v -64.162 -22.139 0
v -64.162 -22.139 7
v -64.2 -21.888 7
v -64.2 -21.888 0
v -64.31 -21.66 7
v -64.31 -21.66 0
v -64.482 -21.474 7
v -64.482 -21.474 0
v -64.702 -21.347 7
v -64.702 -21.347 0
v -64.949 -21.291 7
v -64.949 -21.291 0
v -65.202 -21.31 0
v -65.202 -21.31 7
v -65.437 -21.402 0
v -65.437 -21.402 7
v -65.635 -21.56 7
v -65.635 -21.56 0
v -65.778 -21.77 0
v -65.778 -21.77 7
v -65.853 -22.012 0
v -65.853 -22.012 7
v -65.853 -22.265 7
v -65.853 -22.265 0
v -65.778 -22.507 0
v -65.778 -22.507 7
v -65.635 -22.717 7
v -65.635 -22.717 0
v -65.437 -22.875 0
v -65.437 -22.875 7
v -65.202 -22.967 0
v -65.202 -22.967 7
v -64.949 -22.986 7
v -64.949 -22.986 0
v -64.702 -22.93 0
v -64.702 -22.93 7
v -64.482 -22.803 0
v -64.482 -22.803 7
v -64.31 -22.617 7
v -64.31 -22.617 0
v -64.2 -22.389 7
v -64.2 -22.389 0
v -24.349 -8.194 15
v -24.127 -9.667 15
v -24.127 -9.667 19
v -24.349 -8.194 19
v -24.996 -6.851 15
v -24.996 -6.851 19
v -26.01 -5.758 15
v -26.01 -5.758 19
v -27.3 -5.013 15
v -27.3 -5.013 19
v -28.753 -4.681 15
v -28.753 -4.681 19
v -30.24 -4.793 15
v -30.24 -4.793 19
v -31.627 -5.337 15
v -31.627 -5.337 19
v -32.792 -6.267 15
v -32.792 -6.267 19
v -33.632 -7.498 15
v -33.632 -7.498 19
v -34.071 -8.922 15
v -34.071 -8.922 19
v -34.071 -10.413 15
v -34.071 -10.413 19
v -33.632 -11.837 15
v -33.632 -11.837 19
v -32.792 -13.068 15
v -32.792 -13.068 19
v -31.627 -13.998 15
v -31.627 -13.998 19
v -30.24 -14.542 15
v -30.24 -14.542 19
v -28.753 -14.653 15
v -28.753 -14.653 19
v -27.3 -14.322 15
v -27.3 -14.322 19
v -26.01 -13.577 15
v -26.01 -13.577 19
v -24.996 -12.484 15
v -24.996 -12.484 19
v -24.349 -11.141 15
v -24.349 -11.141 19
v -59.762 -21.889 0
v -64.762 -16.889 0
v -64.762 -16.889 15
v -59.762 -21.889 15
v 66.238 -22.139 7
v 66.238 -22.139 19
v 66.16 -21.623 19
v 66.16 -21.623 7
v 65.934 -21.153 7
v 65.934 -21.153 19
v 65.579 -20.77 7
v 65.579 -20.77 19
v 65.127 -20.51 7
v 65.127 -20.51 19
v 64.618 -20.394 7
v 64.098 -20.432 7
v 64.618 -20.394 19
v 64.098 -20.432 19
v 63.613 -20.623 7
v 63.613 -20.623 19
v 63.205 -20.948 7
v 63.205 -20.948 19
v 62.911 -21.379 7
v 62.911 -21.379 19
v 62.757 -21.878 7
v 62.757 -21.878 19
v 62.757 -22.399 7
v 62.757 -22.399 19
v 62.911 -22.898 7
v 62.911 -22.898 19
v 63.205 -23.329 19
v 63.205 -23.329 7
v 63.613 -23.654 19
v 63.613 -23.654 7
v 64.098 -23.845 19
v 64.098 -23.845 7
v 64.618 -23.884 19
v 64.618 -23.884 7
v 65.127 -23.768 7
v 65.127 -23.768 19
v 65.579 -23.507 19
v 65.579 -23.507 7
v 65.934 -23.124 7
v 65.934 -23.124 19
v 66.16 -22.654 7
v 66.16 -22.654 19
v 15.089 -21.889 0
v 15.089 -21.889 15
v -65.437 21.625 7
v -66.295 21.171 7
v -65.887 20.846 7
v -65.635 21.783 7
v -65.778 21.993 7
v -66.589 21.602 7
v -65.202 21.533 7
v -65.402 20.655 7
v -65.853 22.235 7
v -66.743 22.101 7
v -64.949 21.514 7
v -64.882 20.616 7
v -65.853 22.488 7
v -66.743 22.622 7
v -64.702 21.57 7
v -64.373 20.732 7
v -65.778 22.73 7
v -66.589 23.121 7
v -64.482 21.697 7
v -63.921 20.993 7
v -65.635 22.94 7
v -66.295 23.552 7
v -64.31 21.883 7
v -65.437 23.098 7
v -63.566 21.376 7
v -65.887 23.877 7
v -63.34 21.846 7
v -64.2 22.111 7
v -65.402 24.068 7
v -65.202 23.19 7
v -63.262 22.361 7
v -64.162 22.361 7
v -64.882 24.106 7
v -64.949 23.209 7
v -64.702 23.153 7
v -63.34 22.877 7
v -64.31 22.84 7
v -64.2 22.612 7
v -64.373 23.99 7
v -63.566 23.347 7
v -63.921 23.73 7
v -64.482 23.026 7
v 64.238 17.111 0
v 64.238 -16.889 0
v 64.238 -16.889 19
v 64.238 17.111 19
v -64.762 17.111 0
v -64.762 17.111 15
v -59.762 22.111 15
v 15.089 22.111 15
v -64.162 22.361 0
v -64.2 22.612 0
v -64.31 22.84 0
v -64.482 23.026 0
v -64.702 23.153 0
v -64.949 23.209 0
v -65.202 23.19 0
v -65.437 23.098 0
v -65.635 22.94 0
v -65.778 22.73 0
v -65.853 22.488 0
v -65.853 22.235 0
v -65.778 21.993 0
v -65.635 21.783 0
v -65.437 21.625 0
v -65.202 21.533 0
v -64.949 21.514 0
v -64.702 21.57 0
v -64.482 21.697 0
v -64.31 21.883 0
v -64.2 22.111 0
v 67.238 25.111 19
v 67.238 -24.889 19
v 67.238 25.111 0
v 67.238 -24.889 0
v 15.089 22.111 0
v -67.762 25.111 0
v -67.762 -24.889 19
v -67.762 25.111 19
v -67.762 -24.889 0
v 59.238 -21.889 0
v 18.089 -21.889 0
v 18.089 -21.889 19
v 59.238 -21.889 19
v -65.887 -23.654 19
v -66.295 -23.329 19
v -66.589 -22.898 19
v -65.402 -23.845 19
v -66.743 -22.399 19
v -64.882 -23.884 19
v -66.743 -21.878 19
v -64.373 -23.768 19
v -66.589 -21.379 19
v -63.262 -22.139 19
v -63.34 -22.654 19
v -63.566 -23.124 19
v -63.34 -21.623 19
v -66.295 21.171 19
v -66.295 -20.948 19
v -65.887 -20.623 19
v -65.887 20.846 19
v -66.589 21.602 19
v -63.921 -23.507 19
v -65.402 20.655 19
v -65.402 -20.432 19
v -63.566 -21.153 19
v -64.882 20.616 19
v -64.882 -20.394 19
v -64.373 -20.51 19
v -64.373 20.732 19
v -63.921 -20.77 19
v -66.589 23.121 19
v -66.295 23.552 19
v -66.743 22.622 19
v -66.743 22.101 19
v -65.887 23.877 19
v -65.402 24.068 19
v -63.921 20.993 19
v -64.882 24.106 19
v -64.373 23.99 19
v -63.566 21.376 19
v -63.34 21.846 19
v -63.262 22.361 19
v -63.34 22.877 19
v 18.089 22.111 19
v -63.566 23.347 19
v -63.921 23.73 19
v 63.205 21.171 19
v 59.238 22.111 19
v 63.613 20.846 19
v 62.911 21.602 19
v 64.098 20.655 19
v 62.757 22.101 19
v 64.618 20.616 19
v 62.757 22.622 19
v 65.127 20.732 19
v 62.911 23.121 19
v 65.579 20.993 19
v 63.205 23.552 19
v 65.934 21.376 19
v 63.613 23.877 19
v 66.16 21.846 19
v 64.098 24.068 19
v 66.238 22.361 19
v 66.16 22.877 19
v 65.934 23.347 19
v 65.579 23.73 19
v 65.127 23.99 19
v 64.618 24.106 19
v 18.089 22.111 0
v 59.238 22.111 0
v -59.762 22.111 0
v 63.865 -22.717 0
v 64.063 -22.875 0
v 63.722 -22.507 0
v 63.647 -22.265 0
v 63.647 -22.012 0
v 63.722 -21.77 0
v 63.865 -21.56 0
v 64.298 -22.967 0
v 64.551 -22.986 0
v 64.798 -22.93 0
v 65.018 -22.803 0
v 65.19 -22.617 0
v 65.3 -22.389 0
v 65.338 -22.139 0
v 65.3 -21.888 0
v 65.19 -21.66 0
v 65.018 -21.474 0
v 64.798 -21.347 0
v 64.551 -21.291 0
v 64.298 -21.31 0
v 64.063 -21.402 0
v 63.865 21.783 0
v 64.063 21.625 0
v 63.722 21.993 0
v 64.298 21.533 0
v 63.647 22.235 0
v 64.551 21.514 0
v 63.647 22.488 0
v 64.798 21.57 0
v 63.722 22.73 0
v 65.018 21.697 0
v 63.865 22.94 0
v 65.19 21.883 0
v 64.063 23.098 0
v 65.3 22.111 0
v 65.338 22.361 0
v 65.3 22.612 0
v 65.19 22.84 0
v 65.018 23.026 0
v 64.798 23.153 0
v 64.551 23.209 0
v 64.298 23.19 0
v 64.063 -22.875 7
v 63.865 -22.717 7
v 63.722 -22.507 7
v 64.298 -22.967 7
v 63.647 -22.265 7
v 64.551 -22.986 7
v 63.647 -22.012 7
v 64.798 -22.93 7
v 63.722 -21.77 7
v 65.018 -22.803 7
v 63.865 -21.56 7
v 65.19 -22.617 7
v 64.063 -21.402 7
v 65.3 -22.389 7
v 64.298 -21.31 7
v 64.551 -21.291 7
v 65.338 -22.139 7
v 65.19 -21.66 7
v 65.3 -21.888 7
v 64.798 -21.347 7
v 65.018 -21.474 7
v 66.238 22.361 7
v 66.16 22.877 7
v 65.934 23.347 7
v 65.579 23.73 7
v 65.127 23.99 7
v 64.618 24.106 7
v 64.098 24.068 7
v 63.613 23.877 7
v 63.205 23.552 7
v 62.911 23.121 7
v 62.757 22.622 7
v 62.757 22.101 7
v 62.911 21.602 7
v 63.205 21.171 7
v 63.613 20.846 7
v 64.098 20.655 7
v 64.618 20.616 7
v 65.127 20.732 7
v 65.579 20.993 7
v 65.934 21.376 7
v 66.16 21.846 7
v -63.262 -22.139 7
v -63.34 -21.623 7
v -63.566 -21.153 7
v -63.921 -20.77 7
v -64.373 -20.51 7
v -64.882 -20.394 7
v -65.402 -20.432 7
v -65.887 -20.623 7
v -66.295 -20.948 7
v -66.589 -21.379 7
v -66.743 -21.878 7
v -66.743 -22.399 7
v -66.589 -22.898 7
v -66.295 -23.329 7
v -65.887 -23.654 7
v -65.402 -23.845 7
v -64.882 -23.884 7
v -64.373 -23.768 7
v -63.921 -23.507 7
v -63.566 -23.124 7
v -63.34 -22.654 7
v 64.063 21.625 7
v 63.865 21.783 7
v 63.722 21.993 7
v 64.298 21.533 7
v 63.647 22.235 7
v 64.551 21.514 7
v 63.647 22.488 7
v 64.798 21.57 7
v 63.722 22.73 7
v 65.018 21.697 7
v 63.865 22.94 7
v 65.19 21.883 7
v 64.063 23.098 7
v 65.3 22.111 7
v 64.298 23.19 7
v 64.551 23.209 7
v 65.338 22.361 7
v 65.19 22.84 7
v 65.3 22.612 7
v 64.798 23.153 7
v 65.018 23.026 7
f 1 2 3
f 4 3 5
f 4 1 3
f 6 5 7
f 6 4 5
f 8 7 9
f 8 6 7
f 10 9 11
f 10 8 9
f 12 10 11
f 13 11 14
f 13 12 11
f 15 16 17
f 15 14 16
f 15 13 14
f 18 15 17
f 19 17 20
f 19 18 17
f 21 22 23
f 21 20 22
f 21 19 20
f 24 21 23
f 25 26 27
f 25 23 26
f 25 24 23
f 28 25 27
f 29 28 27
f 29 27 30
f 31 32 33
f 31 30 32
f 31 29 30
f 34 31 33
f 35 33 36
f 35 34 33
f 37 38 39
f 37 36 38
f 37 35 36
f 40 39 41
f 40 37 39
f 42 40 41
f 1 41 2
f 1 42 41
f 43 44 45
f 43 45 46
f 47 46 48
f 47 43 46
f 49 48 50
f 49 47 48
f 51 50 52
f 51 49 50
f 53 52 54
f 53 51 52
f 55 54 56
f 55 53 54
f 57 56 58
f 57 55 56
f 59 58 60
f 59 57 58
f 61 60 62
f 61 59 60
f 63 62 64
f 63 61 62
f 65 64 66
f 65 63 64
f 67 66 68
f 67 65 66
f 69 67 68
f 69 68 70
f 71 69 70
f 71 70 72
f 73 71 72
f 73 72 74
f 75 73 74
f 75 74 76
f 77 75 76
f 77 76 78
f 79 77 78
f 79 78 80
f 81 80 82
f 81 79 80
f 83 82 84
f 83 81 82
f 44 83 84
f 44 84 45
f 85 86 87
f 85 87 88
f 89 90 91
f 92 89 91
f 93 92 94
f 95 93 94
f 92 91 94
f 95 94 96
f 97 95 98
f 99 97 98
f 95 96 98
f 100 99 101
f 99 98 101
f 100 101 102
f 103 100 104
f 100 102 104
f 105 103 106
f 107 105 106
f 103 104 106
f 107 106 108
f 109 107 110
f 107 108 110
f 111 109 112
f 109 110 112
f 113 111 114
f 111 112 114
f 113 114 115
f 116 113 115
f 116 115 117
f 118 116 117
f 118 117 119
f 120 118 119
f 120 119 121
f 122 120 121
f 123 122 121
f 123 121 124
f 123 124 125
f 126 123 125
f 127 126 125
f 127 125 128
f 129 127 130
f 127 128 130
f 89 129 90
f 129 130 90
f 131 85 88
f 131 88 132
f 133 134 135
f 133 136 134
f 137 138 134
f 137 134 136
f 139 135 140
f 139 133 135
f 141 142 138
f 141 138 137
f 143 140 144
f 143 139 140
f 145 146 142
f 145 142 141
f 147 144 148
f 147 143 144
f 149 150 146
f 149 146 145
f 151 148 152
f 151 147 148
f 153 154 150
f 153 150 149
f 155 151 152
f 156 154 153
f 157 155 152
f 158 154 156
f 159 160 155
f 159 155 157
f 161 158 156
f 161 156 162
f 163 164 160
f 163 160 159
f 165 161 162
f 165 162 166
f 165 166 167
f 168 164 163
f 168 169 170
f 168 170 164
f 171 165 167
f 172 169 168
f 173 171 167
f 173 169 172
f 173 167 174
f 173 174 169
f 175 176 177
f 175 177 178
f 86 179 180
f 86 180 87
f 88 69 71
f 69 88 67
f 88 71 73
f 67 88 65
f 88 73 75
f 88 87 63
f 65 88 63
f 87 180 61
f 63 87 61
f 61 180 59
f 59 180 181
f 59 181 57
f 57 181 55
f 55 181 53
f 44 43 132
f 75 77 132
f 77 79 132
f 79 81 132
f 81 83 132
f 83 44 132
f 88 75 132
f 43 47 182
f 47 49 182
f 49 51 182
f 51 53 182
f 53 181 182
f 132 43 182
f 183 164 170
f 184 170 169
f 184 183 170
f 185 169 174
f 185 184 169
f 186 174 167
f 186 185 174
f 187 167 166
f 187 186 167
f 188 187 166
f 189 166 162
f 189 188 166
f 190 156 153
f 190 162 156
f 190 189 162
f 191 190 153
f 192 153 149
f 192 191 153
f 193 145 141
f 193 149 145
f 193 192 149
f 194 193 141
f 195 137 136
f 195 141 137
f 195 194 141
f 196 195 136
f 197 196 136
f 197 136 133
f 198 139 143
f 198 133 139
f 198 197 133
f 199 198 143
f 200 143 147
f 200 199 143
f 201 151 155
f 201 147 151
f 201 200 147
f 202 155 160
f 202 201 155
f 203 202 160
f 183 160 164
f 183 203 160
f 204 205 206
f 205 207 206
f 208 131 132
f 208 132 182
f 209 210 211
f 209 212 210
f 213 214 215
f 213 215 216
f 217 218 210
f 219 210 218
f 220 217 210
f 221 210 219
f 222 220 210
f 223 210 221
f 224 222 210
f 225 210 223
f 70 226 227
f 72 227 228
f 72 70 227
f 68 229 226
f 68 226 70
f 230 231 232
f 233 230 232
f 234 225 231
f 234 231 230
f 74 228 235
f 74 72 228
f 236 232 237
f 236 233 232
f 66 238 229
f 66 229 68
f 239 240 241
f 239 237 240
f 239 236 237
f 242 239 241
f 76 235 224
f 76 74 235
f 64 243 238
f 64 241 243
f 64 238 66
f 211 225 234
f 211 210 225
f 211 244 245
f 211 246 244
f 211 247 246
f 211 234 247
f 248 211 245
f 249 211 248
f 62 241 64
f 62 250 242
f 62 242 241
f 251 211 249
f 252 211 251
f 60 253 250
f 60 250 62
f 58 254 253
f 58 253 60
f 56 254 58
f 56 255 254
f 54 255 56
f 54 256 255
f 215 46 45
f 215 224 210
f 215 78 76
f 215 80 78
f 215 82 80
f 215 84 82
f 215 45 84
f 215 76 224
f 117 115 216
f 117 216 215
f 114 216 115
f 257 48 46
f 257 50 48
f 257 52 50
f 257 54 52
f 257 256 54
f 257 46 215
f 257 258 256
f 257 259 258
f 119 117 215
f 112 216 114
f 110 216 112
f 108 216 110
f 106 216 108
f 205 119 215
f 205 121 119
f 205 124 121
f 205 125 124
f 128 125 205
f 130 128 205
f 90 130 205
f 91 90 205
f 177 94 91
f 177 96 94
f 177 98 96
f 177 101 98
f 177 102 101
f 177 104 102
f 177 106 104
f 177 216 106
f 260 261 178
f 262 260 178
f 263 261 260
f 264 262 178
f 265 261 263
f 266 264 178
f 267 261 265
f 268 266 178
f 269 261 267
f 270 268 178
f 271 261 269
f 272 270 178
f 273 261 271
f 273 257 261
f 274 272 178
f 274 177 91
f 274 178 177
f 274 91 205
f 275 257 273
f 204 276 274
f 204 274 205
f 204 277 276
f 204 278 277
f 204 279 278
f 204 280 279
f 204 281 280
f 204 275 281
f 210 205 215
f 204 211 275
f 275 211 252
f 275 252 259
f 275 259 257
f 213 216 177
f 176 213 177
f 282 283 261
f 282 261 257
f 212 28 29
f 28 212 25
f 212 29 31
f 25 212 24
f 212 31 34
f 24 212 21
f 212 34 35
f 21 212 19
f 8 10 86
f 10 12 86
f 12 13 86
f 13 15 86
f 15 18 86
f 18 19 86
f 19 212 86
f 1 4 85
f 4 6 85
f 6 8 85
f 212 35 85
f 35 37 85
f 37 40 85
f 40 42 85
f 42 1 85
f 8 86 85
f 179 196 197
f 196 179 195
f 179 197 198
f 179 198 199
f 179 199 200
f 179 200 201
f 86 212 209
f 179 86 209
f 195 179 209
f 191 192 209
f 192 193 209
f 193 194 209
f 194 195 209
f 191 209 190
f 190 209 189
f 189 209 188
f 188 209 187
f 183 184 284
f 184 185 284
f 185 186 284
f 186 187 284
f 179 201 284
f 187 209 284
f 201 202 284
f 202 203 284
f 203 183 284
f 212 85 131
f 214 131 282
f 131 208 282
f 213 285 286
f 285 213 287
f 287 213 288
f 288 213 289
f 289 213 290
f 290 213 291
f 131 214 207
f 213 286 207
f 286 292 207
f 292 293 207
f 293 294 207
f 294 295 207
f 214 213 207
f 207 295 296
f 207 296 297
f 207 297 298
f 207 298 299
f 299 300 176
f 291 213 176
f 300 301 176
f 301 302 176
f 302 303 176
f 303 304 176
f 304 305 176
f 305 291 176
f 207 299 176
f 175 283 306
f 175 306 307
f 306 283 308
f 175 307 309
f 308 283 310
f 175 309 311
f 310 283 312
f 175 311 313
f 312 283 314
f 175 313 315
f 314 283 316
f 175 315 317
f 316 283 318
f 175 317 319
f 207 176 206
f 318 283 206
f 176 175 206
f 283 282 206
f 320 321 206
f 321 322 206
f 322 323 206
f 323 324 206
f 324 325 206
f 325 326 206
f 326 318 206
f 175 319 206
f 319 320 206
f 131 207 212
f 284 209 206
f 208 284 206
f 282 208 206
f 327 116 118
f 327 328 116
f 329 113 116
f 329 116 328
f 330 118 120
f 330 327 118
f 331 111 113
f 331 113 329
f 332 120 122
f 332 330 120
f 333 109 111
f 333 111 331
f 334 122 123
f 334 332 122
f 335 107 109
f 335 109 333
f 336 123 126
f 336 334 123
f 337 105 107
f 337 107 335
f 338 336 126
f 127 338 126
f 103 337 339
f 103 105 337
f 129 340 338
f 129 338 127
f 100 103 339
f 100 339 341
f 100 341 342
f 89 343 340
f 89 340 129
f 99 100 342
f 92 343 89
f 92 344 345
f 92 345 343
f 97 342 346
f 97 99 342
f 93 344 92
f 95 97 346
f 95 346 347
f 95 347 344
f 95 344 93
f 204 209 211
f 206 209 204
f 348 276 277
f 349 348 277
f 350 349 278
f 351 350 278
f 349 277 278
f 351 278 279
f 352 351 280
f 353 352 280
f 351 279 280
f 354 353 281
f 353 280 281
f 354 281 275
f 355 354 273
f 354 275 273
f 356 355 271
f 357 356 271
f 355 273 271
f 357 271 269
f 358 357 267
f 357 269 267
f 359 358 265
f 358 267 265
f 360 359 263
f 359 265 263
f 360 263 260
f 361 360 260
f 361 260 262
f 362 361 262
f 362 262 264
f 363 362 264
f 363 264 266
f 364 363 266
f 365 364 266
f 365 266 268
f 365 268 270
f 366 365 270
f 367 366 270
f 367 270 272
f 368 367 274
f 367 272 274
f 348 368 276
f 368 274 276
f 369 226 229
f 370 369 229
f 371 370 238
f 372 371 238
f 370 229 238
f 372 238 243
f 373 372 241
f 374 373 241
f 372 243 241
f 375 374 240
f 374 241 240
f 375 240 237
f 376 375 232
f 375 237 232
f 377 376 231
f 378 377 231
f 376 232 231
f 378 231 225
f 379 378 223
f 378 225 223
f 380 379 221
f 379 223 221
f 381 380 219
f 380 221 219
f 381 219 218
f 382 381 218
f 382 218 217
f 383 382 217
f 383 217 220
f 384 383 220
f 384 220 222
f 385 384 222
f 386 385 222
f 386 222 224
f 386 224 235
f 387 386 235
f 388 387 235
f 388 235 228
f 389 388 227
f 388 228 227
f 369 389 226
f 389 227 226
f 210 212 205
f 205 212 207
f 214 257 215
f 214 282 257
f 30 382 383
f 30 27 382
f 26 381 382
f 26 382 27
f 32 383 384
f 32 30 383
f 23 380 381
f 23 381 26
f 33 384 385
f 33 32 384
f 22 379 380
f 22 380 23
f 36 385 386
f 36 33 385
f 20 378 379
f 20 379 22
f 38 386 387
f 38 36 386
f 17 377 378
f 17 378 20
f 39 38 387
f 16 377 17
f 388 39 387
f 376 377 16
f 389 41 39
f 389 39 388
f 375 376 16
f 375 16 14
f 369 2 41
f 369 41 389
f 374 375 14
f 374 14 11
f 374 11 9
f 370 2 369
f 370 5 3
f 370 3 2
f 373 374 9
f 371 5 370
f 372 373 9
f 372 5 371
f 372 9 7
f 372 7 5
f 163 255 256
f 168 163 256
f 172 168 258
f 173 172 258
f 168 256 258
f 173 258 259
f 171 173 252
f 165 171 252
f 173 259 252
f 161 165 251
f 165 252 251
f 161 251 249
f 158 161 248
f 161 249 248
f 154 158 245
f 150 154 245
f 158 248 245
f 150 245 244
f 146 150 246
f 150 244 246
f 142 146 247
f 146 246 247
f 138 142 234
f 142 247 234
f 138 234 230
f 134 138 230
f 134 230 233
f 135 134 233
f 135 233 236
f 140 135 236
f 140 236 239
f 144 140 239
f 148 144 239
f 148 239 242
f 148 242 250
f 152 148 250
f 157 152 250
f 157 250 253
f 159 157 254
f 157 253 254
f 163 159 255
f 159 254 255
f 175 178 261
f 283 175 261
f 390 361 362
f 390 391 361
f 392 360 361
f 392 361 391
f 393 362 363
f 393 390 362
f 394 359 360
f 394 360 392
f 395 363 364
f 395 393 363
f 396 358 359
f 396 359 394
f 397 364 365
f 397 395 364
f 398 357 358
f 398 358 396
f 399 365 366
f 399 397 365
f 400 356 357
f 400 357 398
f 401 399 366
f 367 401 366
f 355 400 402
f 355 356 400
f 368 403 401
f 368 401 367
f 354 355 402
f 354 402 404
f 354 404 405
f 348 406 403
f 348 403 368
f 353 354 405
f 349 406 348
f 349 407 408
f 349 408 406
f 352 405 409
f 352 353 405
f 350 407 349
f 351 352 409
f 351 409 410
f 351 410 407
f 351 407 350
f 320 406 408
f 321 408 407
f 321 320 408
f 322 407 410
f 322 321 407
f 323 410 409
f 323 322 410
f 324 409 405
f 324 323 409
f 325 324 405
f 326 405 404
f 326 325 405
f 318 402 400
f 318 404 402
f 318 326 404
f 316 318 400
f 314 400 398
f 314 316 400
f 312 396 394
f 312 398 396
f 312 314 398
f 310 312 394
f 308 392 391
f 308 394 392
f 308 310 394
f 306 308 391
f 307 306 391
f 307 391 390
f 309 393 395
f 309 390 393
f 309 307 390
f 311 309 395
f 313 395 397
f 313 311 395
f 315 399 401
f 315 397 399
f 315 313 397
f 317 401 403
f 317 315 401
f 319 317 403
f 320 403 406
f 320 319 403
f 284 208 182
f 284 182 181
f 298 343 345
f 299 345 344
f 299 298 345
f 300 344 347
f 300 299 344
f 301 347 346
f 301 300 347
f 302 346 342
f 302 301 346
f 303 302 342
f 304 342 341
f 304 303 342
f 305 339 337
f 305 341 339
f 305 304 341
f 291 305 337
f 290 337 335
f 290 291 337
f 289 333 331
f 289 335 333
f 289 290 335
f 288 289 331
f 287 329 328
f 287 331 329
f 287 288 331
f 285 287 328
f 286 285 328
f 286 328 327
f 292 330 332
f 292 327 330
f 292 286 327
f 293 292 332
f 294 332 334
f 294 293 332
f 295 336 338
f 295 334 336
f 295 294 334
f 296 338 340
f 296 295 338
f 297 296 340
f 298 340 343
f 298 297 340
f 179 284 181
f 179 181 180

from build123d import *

# Parameters (mm, degrees)
CROQUIS1_W              = 135
CROQUIS1_H              = 50
CROQUIS1_R              = 0.85
SALIENTE_EXTRUIR1_DEPTH = 15
CROQUIS2_W              = 135
CROQUIS2_H              = 50
CROQUIS2_R              = 0.85
CROQUIS2_R_2            = 5
SALIENTE_EXTRUIR2_DEPTH = 4
CROQUIS3_R              = 1.75
CORTAR_EXTRUIR1_DEPTH   = 12


with BuildPart() as part:
    # Croquis1 → Saliente-Extruir1 (new body)
    with BuildSketch(Plane.XY):
        with Locations((-0.262377426, 0.111379231)):
            Rectangle(CROQUIS1_W, CROQUIS1_H)
        with Locations((-65.012377426, 22.361379231)):
            Circle(CROQUIS1_R, mode=Mode.SUBTRACT)
        with Locations((-65.012377426, -22.138620769)):
            Circle(CROQUIS1_R, mode=Mode.SUBTRACT)
        with Locations((64.487622574, -22.138620769)):
            Circle(CROQUIS1_R, mode=Mode.SUBTRACT)
        with Locations((64.487622574, 22.361379231)):
            Circle(CROQUIS1_R, mode=Mode.SUBTRACT)
        Polygon((-64.762377426, 17.111379231), (-64.762377426, -16.888620769), (-59.762377426, -21.888620769), (15.089266591, -21.888620769), (15.089266591, 22.111379231), (-59.762377426, 22.111379231), align=None, mode=Mode.SUBTRACT)
        Polygon((64.237622574, 17.111379231), (59.237622574, 22.111379231), (18.089266591, 22.111379231), (18.089266591, -21.888620769), (59.237622574, -21.888620769), (64.237622574, -16.888620769), align=None, mode=Mode.SUBTRACT)
    extrude(amount=SALIENTE_EXTRUIR1_DEPTH)

    # Croquis2 → Saliente-Extruir2 (add)
    with BuildSketch(Plane.XY.offset(15)):
        with Locations((-0.262377426, 0.111379231)):
            Rectangle(CROQUIS2_W, CROQUIS2_H)
        with Locations((-65.012377426, 22.361379231)):
            Circle(CROQUIS2_R, mode=Mode.SUBTRACT)
        with Locations((64.487622574, 22.361379231)):
            Circle(CROQUIS2_R, mode=Mode.SUBTRACT)
        with Locations((64.487622574, -22.138620769)):
            Circle(CROQUIS2_R, mode=Mode.SUBTRACT)
        with Locations((-65.012377426, -22.138620769)):
            Circle(CROQUIS2_R, mode=Mode.SUBTRACT)
        with Locations((-29.126949829, -9.66737546)):
            Circle(CROQUIS2_R_2, mode=Mode.SUBTRACT)
        Polygon((18.089266591, 22.111379231), (18.089266591, -21.888620769), (59.237622574, -21.888620769), (64.237622574, -16.888620769), (64.237622574, 17.111379231), (59.237622574, 22.111379231), align=None, mode=Mode.SUBTRACT)
    extrude(amount=SALIENTE_EXTRUIR2_DEPTH)

    # Croquis3 → Cortar-Extruir1 (cut)
    with BuildSketch(Plane.XY.offset(19)):
        with Locations((64.487622574, 22.361379231)):
            Circle(CROQUIS3_R)
        with Locations((64.487622574, -22.138620769)):
            Circle(CROQUIS3_R)
        with Locations((-65.012377426, -22.138620769)):
            Circle(CROQUIS3_R)
        with Locations((-65.012377426, 22.361379231)):
            Circle(CROQUIS3_R)
    extrude(amount=-CORTAR_EXTRUIR1_DEPTH, mode=Mode.SUBTRACT)


solid = part.part
